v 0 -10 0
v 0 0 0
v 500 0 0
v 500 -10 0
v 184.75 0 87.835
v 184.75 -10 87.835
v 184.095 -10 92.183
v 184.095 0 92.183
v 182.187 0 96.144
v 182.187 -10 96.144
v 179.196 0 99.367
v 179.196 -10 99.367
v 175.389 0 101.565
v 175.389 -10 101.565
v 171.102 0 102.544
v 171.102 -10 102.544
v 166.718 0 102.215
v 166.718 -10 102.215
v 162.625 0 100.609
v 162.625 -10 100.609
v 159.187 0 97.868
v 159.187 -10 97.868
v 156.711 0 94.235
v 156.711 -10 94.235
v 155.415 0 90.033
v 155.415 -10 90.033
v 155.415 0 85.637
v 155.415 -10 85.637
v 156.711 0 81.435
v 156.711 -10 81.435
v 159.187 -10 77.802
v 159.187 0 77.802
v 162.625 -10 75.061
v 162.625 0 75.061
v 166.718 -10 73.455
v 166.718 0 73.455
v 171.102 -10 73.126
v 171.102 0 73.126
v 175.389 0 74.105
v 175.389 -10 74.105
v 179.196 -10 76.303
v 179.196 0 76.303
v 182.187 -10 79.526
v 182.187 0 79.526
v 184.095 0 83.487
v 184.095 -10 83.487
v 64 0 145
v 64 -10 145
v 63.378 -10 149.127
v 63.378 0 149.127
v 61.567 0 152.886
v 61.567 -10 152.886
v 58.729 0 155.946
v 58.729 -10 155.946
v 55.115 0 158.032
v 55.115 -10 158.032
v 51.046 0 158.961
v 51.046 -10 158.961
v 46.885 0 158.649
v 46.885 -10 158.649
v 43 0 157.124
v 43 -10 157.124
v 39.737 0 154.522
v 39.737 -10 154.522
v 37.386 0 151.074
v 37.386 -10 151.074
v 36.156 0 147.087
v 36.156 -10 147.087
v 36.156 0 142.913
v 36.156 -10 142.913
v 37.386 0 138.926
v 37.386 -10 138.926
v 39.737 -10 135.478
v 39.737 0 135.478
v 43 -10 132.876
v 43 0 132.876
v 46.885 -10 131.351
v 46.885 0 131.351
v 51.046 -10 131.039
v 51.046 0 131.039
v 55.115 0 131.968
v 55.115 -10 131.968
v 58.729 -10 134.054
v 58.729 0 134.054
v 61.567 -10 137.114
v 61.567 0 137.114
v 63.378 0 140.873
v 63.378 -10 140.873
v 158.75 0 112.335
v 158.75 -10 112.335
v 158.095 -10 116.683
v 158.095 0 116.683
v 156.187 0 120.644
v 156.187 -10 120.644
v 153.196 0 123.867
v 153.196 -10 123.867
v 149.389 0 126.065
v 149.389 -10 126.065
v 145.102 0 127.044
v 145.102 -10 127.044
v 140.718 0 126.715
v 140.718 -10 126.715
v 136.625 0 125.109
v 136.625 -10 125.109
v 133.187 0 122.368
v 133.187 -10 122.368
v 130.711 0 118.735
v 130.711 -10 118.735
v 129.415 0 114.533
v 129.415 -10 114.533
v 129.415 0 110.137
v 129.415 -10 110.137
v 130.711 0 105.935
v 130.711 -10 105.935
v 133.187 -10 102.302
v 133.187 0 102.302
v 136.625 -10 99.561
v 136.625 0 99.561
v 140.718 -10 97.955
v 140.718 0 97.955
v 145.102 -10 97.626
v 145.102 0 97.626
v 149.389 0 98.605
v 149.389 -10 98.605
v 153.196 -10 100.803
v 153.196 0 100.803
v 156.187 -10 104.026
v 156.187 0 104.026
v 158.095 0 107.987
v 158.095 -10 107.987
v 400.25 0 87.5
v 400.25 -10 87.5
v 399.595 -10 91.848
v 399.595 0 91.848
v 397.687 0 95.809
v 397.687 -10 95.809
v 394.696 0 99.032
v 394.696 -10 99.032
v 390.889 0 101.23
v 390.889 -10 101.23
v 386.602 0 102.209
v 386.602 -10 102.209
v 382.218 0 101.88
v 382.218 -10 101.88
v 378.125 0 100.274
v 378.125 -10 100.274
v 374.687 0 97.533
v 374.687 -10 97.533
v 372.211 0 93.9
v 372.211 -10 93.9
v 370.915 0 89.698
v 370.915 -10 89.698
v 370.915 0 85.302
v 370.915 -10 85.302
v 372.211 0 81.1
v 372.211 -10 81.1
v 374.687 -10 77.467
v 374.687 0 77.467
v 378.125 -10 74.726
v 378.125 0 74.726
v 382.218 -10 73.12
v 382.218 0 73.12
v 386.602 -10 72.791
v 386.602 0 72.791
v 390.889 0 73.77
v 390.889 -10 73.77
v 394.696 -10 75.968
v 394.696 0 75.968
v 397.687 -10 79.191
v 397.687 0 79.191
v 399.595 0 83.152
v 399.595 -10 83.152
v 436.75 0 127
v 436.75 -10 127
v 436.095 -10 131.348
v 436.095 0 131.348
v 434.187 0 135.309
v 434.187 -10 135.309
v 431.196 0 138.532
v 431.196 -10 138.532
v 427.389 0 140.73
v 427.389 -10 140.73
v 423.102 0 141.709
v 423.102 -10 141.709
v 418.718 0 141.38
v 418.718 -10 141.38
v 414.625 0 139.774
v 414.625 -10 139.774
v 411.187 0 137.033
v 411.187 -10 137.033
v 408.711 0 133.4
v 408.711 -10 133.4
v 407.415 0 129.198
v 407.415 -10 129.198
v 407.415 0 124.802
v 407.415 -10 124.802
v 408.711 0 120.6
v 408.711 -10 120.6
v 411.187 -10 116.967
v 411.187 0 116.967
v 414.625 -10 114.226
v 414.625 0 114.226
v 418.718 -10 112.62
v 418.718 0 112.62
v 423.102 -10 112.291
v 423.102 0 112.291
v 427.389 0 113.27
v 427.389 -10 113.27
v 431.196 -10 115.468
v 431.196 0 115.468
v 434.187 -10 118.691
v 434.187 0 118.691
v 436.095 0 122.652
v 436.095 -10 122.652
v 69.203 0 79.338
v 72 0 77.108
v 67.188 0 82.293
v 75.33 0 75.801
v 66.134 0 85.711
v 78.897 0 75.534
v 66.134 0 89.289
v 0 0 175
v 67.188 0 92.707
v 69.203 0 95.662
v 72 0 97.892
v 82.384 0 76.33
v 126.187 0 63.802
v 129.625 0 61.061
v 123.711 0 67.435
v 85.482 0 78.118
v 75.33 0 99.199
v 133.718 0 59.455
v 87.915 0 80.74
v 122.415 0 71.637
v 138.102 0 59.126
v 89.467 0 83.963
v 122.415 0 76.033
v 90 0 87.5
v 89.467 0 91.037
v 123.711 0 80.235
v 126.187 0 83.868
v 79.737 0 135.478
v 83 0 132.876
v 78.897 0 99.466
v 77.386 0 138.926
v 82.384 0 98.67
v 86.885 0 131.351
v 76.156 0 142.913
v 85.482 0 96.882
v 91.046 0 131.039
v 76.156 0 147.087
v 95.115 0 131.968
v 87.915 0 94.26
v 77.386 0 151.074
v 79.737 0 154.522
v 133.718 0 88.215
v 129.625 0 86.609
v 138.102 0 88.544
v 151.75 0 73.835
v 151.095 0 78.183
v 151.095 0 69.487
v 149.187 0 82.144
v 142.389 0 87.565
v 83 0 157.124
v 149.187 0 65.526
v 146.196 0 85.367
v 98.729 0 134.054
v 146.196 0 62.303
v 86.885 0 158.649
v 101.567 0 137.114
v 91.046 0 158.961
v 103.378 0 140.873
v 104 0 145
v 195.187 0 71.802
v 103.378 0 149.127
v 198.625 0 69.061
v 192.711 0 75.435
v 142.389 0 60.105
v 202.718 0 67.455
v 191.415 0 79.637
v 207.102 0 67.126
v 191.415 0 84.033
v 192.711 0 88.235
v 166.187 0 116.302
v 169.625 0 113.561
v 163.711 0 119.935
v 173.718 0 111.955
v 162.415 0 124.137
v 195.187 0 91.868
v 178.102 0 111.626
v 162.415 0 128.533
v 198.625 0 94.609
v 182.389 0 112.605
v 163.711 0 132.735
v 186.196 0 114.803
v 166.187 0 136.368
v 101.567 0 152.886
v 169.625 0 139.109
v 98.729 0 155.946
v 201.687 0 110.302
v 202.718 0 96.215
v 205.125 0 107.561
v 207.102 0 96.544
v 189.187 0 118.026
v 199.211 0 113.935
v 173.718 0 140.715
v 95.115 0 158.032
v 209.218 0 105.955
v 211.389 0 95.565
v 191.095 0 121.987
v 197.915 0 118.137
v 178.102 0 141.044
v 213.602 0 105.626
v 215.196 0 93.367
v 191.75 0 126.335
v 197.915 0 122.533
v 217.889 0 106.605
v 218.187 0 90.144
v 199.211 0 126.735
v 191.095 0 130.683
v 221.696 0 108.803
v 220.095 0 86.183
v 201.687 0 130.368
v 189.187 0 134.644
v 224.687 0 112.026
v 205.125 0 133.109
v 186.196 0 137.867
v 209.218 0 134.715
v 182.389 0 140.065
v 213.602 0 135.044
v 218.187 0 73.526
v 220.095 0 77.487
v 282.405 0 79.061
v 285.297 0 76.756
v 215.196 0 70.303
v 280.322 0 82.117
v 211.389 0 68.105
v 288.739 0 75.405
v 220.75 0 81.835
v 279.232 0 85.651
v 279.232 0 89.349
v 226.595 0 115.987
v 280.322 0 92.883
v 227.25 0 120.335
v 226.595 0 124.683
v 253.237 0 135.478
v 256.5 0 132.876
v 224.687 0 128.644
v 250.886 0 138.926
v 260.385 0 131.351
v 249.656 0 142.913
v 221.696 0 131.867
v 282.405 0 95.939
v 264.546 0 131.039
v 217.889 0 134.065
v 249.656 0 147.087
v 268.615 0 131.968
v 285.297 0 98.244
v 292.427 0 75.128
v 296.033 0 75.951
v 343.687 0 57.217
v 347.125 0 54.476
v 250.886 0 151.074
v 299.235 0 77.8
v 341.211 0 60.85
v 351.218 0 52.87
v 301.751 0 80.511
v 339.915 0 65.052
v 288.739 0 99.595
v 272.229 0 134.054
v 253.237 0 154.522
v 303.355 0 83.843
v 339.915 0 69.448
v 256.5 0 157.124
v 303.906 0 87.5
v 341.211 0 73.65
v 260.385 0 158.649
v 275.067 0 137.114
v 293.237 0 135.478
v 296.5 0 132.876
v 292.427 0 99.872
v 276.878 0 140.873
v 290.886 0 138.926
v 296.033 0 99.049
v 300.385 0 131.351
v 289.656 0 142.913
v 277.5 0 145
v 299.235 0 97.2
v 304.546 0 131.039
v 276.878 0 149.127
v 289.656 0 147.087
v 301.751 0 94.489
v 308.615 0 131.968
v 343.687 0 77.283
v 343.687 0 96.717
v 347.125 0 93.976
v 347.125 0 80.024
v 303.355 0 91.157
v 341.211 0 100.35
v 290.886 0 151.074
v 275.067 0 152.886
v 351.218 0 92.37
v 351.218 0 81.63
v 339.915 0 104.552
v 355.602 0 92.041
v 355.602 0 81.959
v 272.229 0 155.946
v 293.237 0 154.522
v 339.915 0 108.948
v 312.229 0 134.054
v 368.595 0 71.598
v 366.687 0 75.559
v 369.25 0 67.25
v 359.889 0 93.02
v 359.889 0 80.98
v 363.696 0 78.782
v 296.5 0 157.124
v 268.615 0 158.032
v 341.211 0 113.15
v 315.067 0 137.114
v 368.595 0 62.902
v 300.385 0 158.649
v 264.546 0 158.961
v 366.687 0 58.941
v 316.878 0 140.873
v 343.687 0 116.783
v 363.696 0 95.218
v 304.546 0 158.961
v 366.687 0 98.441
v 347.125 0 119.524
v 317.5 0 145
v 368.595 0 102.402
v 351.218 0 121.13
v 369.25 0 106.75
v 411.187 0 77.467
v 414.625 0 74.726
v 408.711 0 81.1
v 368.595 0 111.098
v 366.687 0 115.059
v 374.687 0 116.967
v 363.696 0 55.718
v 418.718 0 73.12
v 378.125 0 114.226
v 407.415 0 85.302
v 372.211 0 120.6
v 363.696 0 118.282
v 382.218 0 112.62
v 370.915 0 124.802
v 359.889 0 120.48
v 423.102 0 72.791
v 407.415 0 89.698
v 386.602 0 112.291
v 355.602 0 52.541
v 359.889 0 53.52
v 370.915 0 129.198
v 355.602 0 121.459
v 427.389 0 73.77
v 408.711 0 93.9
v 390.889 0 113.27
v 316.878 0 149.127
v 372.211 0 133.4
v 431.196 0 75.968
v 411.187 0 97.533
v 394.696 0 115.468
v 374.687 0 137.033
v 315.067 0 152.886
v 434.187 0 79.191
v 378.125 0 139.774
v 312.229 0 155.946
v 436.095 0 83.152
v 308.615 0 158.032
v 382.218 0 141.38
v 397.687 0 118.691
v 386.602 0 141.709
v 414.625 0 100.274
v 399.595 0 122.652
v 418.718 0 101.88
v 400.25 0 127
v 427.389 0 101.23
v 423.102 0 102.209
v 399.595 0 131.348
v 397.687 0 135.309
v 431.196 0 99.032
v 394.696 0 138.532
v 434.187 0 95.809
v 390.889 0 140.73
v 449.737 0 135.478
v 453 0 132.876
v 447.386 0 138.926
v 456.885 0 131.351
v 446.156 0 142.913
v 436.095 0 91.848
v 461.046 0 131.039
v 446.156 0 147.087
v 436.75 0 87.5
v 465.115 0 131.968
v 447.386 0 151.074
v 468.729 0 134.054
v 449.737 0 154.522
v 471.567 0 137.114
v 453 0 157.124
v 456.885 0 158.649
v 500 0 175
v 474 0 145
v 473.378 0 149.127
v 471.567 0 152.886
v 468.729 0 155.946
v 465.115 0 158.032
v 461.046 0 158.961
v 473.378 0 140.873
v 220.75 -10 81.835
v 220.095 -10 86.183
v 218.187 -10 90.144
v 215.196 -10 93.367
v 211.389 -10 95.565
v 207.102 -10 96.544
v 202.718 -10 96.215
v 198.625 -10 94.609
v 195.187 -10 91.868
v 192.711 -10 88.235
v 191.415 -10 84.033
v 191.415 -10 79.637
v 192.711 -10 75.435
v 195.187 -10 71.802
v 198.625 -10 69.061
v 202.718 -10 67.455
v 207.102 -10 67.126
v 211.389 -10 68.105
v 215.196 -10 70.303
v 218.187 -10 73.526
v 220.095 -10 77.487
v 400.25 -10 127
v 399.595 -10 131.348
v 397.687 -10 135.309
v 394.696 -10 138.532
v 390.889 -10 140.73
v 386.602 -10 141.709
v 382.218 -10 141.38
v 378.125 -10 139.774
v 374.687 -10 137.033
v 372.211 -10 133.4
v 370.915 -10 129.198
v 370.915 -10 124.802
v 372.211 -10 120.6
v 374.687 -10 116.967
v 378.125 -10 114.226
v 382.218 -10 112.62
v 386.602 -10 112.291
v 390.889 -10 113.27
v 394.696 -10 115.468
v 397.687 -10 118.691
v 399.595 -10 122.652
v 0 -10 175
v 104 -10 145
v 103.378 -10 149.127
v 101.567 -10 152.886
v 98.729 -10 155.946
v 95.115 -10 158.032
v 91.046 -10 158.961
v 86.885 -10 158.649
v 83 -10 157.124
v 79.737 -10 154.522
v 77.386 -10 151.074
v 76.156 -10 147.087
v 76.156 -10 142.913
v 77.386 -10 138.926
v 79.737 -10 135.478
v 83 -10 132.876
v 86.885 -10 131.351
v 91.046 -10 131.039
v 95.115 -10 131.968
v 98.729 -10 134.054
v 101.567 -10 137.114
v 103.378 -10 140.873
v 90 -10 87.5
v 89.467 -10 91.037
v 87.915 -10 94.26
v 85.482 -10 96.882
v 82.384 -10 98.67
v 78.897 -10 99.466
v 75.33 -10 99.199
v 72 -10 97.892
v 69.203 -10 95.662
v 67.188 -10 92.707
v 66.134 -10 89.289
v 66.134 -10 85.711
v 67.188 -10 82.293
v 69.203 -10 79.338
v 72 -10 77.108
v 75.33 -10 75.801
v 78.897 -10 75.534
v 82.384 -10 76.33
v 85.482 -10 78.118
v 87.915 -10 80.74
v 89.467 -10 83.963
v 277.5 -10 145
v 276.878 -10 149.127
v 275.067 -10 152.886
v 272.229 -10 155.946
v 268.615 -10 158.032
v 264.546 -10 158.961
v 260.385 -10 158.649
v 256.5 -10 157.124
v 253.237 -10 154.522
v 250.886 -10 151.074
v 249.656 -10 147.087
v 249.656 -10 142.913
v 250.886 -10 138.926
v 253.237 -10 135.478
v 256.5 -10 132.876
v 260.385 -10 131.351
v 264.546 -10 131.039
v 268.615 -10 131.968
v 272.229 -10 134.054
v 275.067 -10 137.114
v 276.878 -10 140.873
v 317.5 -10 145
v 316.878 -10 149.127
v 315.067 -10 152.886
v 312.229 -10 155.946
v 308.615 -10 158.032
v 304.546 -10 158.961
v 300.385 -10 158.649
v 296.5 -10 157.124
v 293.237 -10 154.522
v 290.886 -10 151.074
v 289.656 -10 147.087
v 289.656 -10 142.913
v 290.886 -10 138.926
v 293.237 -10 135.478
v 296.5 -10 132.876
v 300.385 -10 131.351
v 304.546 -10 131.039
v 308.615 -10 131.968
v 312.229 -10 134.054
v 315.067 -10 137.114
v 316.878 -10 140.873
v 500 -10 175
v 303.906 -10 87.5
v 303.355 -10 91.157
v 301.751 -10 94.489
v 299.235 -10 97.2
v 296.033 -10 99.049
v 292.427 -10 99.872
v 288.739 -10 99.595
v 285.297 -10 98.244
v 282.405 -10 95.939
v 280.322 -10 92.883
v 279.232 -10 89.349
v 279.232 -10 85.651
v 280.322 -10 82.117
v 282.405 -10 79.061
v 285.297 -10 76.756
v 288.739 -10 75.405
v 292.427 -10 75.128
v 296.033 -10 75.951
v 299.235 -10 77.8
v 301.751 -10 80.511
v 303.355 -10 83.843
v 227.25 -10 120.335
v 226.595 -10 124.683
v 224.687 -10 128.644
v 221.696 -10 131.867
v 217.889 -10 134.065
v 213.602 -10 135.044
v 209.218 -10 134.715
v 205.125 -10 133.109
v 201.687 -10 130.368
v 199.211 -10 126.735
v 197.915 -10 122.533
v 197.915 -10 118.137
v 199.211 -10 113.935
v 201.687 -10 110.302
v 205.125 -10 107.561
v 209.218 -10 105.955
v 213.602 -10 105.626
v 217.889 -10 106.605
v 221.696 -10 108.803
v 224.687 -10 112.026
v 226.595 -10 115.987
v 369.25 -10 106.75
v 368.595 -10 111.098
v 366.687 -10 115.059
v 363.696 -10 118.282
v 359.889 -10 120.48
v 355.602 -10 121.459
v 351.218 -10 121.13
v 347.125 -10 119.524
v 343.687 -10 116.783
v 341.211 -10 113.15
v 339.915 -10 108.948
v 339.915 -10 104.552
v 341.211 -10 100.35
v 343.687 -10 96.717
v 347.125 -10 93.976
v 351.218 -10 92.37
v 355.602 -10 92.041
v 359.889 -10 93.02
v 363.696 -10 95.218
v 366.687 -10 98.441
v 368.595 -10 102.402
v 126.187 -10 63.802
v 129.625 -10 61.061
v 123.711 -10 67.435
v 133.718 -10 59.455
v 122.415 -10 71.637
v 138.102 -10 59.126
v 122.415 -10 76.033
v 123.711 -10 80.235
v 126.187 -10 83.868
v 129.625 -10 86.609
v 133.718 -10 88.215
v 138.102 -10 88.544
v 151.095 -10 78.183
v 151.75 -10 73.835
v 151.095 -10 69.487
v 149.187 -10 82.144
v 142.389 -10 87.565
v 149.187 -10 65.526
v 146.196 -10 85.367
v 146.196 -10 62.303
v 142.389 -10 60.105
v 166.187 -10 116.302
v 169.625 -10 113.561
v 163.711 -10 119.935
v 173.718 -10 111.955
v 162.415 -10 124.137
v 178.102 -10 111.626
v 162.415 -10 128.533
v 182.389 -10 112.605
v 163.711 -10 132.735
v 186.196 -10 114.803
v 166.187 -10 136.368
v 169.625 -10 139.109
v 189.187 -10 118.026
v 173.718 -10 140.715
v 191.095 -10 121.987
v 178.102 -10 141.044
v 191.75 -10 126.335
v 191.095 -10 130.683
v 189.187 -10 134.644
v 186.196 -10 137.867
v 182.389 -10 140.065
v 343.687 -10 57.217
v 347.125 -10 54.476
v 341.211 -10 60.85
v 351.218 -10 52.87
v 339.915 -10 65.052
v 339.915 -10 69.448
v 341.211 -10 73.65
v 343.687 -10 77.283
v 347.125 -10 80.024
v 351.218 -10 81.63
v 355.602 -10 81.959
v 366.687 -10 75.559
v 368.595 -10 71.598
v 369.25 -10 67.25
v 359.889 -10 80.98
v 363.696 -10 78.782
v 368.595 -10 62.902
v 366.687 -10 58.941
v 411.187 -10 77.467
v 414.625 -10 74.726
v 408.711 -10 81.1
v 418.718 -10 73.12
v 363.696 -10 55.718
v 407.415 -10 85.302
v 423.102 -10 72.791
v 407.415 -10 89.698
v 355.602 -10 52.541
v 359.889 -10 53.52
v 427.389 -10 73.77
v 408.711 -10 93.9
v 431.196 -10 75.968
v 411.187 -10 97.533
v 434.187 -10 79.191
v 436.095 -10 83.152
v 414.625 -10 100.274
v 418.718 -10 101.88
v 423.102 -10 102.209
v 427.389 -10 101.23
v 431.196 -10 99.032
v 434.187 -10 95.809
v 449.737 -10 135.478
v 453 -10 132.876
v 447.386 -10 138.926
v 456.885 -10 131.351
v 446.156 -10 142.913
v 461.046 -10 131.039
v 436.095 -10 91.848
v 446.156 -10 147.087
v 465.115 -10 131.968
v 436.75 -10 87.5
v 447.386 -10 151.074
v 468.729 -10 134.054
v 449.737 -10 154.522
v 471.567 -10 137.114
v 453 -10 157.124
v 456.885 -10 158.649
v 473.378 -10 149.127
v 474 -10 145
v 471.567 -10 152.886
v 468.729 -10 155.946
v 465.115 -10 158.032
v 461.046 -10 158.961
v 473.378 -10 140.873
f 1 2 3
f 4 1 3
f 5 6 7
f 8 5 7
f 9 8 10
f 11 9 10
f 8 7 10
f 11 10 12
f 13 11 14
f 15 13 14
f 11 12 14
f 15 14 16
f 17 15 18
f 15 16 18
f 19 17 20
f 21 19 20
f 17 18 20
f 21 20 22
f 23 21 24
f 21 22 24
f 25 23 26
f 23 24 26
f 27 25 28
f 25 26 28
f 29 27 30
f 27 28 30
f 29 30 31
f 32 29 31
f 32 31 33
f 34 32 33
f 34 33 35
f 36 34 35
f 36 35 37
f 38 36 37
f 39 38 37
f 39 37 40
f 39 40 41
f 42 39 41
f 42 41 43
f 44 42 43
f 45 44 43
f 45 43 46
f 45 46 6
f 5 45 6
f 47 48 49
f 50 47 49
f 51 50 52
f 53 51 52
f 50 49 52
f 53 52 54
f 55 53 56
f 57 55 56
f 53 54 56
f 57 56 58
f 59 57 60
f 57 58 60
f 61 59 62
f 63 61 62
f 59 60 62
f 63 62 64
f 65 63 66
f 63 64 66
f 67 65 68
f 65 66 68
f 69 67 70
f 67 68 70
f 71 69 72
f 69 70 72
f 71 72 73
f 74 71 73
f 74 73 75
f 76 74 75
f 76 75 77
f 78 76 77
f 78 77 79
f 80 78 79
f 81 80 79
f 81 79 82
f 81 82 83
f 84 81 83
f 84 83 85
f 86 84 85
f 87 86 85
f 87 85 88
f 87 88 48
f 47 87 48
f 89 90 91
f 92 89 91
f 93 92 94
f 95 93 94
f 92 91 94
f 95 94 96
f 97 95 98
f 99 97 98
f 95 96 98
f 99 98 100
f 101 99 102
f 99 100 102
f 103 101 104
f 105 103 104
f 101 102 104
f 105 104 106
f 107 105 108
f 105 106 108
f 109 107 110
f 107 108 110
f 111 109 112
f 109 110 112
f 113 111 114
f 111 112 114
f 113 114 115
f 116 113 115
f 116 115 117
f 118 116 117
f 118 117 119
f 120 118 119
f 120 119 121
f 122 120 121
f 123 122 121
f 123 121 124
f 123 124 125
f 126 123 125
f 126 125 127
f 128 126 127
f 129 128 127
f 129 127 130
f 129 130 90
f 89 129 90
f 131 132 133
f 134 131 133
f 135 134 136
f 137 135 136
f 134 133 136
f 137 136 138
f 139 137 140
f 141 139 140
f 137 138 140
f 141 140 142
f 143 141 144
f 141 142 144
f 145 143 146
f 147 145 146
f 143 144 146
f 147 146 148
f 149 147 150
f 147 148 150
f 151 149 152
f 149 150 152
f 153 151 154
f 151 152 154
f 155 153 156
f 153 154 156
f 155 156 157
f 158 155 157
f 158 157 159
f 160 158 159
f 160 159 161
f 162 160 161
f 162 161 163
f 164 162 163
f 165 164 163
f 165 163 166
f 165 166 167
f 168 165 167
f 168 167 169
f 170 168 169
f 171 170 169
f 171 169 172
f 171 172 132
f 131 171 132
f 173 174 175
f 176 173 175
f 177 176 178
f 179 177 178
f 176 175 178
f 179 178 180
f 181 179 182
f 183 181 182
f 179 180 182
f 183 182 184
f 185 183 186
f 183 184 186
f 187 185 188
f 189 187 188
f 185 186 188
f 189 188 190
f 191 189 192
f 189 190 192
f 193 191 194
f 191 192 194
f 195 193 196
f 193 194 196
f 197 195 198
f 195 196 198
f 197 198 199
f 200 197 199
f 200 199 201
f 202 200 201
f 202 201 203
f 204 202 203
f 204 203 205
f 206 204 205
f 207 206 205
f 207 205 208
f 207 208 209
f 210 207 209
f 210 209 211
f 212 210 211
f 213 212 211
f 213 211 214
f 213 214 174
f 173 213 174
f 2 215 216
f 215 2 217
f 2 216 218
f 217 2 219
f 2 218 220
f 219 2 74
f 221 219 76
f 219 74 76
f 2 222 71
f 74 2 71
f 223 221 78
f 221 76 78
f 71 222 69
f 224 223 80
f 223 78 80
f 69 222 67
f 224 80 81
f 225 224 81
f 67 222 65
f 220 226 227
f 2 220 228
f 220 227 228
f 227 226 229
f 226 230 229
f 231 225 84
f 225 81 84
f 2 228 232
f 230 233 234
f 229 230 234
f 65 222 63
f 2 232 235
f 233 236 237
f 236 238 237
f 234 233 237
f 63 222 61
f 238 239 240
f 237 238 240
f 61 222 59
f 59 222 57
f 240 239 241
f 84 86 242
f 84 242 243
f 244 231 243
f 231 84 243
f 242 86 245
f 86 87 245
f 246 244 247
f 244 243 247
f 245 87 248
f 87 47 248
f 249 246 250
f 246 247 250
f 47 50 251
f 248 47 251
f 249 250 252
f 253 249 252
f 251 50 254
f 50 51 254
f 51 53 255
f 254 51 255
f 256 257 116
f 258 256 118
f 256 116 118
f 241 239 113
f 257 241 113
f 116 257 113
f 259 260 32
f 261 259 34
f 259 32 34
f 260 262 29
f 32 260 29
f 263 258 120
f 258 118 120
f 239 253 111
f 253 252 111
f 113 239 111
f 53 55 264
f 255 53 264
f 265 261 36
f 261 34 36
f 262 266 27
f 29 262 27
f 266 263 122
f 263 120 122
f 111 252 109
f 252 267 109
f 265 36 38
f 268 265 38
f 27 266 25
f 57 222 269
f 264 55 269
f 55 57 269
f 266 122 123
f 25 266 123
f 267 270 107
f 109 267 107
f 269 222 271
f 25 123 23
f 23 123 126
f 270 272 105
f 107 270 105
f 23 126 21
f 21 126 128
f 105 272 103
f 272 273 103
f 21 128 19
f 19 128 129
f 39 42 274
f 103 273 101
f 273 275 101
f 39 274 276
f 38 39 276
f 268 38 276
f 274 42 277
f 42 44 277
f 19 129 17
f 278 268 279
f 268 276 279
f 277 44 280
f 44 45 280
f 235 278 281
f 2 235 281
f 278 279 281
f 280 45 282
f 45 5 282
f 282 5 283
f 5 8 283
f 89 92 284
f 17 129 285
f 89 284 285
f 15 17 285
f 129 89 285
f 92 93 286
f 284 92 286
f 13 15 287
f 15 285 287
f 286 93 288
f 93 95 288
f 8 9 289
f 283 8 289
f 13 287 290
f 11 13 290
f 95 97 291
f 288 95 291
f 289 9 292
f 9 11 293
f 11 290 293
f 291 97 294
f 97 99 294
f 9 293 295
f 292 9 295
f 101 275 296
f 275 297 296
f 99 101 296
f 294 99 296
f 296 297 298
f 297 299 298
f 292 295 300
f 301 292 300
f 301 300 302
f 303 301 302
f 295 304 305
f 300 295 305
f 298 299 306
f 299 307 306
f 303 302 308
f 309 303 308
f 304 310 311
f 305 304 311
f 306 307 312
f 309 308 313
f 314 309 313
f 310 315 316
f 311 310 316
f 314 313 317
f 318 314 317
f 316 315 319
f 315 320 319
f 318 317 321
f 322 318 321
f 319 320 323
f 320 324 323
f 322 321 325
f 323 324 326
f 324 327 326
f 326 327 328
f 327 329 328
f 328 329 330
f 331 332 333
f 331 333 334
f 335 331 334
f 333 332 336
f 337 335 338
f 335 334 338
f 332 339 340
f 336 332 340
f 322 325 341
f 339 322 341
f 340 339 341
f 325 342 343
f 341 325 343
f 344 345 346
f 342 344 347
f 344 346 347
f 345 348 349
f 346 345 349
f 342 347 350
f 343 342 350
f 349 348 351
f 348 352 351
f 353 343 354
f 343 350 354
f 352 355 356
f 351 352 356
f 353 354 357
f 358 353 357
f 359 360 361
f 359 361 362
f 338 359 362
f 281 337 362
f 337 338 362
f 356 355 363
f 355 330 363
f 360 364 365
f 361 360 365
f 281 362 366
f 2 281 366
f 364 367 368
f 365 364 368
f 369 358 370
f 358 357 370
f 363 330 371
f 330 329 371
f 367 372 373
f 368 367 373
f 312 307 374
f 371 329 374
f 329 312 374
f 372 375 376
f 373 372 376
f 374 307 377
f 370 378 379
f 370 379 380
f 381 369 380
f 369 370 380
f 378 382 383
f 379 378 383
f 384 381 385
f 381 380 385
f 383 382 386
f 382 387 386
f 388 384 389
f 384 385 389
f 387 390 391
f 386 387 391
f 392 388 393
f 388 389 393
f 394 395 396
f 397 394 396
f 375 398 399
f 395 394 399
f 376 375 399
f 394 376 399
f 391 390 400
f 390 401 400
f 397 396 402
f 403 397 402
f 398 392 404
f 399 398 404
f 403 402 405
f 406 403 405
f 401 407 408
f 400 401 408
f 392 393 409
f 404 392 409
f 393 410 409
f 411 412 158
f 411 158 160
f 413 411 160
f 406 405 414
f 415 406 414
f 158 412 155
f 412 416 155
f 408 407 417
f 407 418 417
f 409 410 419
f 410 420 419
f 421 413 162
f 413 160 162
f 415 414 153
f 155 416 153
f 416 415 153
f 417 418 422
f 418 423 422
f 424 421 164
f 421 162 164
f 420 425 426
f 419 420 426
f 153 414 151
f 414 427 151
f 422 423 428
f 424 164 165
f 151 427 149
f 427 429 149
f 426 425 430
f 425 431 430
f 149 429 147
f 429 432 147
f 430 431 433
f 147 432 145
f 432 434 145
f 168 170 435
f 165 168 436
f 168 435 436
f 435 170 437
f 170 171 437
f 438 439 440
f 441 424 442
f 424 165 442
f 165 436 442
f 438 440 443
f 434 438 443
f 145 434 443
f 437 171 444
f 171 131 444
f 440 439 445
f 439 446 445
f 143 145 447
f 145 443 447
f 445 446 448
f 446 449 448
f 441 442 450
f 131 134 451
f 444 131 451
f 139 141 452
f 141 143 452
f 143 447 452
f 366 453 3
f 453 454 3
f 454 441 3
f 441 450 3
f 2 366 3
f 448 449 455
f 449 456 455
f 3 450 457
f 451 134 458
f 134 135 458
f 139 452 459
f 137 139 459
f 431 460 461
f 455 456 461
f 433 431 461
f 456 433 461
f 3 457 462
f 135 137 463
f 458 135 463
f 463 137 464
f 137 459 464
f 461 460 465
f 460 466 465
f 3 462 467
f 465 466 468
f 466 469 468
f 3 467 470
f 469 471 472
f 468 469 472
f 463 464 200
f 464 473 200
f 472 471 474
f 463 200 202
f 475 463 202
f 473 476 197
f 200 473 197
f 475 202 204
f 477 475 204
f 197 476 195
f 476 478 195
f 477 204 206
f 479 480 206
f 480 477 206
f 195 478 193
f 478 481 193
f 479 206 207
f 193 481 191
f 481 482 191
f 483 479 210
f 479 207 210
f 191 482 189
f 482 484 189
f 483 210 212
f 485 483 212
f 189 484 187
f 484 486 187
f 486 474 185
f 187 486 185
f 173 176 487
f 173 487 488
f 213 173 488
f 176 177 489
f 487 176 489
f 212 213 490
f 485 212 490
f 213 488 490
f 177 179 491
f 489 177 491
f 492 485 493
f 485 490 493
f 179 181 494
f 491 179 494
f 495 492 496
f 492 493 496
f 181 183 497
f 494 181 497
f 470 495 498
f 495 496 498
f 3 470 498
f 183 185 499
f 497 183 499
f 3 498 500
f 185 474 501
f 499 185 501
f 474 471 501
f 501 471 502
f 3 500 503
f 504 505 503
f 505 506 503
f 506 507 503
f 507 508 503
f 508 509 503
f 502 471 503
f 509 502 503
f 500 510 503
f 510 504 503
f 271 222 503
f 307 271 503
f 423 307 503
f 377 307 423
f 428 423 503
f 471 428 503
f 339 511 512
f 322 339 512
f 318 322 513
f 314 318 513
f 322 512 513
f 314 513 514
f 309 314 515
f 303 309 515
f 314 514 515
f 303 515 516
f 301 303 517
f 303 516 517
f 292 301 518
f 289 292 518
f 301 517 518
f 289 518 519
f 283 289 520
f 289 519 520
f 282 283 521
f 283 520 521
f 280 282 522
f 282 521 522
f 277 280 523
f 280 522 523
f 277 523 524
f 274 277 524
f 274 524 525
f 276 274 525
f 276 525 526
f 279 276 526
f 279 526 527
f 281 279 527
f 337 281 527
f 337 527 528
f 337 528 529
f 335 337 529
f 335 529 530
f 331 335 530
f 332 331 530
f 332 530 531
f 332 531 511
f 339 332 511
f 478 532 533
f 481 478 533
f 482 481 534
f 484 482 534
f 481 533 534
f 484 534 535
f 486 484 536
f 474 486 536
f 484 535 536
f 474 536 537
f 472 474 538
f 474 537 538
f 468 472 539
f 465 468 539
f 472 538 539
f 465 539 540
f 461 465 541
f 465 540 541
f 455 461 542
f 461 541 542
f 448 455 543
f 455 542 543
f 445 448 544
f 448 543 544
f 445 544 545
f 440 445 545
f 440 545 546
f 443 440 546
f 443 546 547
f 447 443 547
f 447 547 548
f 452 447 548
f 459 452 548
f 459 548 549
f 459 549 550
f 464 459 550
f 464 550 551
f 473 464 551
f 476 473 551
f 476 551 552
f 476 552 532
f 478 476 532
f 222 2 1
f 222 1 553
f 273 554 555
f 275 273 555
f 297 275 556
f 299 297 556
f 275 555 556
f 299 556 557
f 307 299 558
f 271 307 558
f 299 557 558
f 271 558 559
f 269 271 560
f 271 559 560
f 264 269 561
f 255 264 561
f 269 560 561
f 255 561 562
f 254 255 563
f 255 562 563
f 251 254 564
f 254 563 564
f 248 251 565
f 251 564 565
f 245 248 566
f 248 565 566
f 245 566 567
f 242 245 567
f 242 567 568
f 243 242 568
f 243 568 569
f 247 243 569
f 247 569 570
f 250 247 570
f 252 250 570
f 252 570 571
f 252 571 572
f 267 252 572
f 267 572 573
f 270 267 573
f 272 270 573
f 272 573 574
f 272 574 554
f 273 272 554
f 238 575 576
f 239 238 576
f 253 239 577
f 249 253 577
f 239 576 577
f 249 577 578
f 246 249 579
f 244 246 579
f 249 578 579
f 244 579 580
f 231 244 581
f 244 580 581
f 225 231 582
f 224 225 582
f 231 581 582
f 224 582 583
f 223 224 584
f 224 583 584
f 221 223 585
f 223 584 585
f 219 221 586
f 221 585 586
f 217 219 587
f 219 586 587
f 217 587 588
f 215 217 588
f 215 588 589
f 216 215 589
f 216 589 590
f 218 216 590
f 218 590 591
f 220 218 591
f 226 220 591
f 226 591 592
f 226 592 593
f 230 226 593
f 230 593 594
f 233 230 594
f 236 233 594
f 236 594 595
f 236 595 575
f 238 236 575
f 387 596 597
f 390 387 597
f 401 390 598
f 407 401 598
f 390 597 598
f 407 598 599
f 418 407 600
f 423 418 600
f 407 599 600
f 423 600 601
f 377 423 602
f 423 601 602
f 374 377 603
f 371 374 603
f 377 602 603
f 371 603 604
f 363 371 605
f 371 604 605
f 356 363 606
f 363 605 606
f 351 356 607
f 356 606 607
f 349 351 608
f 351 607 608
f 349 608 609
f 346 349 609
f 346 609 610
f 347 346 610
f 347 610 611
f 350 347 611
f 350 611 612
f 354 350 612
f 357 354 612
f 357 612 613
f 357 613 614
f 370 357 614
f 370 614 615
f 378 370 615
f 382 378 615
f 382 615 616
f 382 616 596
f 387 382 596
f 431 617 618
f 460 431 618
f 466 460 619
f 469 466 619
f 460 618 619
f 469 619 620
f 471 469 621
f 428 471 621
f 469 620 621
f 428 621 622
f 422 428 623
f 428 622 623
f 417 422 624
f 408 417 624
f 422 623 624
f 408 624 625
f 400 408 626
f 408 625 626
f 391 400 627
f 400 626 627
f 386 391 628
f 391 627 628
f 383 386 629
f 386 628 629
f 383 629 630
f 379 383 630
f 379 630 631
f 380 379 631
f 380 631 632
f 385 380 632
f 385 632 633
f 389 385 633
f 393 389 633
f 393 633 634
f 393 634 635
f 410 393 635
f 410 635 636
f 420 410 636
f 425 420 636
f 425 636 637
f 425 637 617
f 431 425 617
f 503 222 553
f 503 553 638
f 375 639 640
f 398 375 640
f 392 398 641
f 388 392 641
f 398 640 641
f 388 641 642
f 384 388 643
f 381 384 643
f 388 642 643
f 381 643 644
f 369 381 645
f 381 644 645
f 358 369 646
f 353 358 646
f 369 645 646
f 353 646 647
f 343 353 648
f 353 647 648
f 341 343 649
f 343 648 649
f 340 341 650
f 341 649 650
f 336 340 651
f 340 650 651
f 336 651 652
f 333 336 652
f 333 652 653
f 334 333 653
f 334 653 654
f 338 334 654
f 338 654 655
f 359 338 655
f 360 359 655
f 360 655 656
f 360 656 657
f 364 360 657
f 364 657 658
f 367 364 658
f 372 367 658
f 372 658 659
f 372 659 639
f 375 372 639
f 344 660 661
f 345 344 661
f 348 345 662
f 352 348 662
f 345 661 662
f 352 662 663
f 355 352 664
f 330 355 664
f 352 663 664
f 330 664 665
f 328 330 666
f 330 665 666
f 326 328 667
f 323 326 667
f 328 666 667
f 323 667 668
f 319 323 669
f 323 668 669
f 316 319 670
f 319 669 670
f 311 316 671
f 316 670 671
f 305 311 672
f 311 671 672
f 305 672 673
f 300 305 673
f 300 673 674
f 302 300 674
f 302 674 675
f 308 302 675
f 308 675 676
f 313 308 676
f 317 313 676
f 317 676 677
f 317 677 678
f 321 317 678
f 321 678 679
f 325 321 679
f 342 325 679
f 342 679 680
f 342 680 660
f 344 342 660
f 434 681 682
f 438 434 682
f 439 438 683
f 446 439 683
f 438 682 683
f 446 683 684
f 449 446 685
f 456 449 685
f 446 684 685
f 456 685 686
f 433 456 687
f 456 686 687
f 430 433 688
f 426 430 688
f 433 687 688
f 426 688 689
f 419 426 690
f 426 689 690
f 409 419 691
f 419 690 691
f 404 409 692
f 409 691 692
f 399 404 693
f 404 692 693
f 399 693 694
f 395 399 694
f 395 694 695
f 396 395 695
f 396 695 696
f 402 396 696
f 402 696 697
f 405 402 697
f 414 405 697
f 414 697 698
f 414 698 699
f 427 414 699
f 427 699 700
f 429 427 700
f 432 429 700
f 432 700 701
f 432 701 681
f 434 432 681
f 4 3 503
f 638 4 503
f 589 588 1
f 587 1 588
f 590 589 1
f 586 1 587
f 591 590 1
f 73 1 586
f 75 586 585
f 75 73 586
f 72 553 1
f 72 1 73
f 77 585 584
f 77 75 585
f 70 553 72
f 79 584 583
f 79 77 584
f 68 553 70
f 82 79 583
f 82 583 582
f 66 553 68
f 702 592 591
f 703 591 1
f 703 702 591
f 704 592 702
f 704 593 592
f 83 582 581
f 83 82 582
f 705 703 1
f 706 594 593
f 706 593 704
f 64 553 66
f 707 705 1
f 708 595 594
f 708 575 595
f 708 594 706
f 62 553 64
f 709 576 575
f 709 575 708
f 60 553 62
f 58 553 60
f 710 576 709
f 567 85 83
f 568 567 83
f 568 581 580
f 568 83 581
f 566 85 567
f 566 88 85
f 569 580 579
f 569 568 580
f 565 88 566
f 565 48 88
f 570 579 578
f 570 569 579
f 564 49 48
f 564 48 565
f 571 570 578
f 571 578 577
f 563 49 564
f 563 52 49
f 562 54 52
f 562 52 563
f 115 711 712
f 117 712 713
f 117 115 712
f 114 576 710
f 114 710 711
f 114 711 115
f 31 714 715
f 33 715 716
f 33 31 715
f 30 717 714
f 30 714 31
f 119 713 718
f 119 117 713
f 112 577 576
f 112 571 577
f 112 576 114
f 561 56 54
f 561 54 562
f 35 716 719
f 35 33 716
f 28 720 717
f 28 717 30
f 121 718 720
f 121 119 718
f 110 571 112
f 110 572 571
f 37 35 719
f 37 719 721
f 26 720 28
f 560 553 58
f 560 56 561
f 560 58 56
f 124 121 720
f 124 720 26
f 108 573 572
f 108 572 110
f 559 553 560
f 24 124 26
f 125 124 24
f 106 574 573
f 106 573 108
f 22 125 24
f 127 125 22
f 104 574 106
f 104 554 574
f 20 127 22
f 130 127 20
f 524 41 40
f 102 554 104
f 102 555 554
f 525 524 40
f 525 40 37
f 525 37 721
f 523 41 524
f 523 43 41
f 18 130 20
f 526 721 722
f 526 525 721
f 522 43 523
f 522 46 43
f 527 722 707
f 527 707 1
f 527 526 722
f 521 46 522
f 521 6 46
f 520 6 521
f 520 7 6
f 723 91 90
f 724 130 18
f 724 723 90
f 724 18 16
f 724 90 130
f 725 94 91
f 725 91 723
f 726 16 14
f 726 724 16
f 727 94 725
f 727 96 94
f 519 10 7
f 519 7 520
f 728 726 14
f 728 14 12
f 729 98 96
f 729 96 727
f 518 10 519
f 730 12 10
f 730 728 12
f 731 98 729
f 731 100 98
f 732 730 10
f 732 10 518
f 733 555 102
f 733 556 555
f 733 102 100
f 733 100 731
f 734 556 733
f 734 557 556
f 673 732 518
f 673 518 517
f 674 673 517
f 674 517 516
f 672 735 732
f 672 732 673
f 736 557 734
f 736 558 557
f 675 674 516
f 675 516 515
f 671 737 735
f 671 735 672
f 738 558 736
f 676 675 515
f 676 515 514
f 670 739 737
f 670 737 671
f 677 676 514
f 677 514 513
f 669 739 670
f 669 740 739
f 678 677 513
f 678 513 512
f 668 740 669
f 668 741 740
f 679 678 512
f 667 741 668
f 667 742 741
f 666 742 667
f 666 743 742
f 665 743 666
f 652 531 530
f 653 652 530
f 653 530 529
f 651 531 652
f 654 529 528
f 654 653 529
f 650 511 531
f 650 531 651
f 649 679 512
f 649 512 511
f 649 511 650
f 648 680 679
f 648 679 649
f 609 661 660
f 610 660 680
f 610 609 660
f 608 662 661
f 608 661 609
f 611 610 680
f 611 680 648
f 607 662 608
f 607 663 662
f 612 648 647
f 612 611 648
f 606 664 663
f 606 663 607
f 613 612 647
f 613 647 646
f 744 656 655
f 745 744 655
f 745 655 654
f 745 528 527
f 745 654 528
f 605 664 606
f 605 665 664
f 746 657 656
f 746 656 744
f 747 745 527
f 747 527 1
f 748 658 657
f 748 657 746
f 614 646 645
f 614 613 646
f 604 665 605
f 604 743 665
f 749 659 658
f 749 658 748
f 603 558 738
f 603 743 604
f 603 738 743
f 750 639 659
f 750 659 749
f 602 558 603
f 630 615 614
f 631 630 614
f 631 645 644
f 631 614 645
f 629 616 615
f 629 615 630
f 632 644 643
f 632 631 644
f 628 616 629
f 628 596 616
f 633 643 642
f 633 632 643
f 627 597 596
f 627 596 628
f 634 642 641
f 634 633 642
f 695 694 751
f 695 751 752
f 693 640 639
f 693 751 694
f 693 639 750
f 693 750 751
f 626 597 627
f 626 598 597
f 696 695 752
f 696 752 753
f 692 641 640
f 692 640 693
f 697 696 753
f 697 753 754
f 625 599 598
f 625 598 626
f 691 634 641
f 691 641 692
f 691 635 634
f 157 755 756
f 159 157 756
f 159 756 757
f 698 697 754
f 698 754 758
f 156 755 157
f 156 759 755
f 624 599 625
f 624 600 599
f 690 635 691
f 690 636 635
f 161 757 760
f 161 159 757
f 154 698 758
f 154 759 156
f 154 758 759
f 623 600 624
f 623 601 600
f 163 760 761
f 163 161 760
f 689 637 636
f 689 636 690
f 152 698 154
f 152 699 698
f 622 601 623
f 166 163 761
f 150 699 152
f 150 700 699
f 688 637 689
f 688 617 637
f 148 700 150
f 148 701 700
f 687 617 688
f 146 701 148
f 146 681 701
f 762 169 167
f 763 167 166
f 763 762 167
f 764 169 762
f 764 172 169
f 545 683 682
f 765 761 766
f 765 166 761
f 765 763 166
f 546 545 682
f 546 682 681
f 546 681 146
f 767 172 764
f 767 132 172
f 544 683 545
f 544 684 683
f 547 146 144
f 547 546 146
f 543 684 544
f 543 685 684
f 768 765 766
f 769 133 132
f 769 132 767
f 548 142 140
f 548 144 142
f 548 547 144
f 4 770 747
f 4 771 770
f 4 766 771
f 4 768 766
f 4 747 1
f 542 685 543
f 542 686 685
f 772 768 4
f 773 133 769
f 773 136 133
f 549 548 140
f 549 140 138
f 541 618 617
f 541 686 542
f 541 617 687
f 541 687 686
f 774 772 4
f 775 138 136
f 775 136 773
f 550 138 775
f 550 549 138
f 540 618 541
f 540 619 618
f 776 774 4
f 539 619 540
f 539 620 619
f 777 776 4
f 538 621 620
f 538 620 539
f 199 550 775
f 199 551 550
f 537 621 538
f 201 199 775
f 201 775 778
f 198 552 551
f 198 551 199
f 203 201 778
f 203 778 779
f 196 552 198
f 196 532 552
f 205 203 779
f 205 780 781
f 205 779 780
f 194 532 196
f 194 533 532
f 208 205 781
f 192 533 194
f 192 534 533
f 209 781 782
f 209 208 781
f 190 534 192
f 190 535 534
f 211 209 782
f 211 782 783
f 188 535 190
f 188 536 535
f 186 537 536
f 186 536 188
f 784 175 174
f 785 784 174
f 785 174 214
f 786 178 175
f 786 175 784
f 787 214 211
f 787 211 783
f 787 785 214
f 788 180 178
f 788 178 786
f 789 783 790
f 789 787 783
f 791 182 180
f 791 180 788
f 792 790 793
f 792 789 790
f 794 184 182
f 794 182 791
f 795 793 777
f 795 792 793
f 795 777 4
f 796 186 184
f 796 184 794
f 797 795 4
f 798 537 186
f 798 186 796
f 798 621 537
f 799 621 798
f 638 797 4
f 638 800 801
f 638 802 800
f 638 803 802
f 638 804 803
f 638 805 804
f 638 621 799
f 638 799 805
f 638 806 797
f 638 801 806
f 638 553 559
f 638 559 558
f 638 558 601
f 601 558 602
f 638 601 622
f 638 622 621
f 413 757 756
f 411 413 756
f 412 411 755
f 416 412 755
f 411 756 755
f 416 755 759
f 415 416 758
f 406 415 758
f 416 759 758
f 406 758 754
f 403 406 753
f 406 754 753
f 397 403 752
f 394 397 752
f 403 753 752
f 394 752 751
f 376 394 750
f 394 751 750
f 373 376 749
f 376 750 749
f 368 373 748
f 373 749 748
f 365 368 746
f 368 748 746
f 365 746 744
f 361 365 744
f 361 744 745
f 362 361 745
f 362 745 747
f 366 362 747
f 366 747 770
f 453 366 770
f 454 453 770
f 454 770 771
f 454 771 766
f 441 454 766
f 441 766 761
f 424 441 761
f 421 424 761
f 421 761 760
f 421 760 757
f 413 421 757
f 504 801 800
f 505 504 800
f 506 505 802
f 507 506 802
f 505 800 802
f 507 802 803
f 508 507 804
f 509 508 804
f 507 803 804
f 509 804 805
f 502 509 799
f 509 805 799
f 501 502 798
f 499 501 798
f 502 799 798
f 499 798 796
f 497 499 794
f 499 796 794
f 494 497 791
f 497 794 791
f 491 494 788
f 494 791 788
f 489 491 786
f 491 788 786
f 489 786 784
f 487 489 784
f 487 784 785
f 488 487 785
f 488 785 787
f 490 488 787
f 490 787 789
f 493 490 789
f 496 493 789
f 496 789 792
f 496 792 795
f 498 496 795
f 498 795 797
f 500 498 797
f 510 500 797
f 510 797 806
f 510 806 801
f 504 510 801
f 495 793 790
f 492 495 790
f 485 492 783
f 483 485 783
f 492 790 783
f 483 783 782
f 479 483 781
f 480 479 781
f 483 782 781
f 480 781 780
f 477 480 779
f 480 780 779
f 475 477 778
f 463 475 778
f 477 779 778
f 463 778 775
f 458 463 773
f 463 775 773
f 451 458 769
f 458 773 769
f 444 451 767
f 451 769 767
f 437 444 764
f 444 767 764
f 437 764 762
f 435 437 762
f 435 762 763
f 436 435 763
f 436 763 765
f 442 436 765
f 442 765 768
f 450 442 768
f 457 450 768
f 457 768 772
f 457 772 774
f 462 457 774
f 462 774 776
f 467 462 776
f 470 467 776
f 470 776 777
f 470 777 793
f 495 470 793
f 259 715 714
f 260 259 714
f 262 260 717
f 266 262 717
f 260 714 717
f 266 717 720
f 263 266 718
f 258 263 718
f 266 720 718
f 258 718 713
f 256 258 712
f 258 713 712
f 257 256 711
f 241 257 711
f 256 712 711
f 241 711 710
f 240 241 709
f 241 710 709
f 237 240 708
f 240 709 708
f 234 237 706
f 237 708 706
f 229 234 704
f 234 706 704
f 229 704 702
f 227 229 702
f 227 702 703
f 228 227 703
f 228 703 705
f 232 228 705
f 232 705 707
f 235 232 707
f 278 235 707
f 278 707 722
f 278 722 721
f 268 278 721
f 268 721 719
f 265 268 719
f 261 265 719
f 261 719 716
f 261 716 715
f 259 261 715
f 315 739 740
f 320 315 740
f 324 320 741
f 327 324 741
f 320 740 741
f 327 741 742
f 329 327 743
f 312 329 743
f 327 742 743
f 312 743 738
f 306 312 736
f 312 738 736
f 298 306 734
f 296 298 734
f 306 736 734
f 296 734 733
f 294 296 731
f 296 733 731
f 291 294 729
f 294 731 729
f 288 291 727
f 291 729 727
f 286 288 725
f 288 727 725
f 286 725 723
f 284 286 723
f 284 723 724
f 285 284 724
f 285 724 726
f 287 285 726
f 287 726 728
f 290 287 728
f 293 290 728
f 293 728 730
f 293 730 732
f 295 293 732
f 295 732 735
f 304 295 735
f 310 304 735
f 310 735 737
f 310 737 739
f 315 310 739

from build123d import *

# Parameters (mm, degrees)
F0_W     = 500
F0_H     = 175
F1_DEPTH = 10
F5_R     = 14.75
F5_R_2   = 12.4064380464
F7_DEPTH = 25
F3_R     = 14.75
F3_R_2   = 12
F8_DEPTH = 25
F6_R     = 14
F9_DEPTH = 25


# Not quite as in the source:
# - a feature names something its author has since deleted; it is built from what else it names


with BuildPart() as f1:
    # F0 (on Front) → F1 (new body)
    with BuildSketch(Plane.XZ):
        with Locations((250, 87.5)):
            Rectangle(F0_W, F0_H)
    extrude(amount=F1_DEPTH)

    # F5 (on face) → F7 (cut)
    with BuildSketch(Plane.XZ.offset(10)):
        with Locations((354.5, 106.75)):
            Circle(F5_R)
        with Locations((385.5, 127)):
            Circle(F5_R)
        with Locations((422, 127)):
            Circle(F5_R)
        with Locations((422, 87.5)):
            Circle(F5_R)
        with Locations((385.5, 87.5)):
            Circle(F5_R)
        with Locations((354.5, 67.25)):
            Circle(F5_R)
        with Locations((291.5, 87.5)):
            Circle(F5_R_2)
    extrude(amount=-F7_DEPTH, mode=Mode.SUBTRACT)

    # F3 (on face) → F8 (cut)
    with BuildSketch(Plane.XZ.offset(10)):
        with Locations((177, 126.3350188136)):
            Circle(F3_R)
        with Locations((212.5, 120.3350188136)):
            Circle(F3_R)
        with Locations((206, 81.8350188136)):
            Circle(F3_R)
        with Locations((170, 87.8350188136)):
            Circle(F3_R)
        with Locations((137, 73.8350188136)):
            Circle(F3_R)
        with Locations((144, 112.3350188136)):
            Circle(F3_R)
        with Locations((78, 87.5)):
            Circle(F3_R_2)
    extrude(amount=-F8_DEPTH, mode=Mode.SUBTRACT)

    # F6 (on face) → F9 (cut)
    with BuildSketch(Plane.XZ.offset(10)):
        with Locations((263.5, 145)):
            Circle(F6_R)
        with Locations((50, 145)):
            Circle(F6_R)
        with Locations((90, 145)):
            Circle(F6_R)
        with Locations((303.5, 145)):
            Circle(F6_R)
        with Locations((460, 145)):
            Circle(F6_R)
    extrude(amount=-F9_DEPTH, mode=Mode.SUBTRACT)


solid = f1.part
